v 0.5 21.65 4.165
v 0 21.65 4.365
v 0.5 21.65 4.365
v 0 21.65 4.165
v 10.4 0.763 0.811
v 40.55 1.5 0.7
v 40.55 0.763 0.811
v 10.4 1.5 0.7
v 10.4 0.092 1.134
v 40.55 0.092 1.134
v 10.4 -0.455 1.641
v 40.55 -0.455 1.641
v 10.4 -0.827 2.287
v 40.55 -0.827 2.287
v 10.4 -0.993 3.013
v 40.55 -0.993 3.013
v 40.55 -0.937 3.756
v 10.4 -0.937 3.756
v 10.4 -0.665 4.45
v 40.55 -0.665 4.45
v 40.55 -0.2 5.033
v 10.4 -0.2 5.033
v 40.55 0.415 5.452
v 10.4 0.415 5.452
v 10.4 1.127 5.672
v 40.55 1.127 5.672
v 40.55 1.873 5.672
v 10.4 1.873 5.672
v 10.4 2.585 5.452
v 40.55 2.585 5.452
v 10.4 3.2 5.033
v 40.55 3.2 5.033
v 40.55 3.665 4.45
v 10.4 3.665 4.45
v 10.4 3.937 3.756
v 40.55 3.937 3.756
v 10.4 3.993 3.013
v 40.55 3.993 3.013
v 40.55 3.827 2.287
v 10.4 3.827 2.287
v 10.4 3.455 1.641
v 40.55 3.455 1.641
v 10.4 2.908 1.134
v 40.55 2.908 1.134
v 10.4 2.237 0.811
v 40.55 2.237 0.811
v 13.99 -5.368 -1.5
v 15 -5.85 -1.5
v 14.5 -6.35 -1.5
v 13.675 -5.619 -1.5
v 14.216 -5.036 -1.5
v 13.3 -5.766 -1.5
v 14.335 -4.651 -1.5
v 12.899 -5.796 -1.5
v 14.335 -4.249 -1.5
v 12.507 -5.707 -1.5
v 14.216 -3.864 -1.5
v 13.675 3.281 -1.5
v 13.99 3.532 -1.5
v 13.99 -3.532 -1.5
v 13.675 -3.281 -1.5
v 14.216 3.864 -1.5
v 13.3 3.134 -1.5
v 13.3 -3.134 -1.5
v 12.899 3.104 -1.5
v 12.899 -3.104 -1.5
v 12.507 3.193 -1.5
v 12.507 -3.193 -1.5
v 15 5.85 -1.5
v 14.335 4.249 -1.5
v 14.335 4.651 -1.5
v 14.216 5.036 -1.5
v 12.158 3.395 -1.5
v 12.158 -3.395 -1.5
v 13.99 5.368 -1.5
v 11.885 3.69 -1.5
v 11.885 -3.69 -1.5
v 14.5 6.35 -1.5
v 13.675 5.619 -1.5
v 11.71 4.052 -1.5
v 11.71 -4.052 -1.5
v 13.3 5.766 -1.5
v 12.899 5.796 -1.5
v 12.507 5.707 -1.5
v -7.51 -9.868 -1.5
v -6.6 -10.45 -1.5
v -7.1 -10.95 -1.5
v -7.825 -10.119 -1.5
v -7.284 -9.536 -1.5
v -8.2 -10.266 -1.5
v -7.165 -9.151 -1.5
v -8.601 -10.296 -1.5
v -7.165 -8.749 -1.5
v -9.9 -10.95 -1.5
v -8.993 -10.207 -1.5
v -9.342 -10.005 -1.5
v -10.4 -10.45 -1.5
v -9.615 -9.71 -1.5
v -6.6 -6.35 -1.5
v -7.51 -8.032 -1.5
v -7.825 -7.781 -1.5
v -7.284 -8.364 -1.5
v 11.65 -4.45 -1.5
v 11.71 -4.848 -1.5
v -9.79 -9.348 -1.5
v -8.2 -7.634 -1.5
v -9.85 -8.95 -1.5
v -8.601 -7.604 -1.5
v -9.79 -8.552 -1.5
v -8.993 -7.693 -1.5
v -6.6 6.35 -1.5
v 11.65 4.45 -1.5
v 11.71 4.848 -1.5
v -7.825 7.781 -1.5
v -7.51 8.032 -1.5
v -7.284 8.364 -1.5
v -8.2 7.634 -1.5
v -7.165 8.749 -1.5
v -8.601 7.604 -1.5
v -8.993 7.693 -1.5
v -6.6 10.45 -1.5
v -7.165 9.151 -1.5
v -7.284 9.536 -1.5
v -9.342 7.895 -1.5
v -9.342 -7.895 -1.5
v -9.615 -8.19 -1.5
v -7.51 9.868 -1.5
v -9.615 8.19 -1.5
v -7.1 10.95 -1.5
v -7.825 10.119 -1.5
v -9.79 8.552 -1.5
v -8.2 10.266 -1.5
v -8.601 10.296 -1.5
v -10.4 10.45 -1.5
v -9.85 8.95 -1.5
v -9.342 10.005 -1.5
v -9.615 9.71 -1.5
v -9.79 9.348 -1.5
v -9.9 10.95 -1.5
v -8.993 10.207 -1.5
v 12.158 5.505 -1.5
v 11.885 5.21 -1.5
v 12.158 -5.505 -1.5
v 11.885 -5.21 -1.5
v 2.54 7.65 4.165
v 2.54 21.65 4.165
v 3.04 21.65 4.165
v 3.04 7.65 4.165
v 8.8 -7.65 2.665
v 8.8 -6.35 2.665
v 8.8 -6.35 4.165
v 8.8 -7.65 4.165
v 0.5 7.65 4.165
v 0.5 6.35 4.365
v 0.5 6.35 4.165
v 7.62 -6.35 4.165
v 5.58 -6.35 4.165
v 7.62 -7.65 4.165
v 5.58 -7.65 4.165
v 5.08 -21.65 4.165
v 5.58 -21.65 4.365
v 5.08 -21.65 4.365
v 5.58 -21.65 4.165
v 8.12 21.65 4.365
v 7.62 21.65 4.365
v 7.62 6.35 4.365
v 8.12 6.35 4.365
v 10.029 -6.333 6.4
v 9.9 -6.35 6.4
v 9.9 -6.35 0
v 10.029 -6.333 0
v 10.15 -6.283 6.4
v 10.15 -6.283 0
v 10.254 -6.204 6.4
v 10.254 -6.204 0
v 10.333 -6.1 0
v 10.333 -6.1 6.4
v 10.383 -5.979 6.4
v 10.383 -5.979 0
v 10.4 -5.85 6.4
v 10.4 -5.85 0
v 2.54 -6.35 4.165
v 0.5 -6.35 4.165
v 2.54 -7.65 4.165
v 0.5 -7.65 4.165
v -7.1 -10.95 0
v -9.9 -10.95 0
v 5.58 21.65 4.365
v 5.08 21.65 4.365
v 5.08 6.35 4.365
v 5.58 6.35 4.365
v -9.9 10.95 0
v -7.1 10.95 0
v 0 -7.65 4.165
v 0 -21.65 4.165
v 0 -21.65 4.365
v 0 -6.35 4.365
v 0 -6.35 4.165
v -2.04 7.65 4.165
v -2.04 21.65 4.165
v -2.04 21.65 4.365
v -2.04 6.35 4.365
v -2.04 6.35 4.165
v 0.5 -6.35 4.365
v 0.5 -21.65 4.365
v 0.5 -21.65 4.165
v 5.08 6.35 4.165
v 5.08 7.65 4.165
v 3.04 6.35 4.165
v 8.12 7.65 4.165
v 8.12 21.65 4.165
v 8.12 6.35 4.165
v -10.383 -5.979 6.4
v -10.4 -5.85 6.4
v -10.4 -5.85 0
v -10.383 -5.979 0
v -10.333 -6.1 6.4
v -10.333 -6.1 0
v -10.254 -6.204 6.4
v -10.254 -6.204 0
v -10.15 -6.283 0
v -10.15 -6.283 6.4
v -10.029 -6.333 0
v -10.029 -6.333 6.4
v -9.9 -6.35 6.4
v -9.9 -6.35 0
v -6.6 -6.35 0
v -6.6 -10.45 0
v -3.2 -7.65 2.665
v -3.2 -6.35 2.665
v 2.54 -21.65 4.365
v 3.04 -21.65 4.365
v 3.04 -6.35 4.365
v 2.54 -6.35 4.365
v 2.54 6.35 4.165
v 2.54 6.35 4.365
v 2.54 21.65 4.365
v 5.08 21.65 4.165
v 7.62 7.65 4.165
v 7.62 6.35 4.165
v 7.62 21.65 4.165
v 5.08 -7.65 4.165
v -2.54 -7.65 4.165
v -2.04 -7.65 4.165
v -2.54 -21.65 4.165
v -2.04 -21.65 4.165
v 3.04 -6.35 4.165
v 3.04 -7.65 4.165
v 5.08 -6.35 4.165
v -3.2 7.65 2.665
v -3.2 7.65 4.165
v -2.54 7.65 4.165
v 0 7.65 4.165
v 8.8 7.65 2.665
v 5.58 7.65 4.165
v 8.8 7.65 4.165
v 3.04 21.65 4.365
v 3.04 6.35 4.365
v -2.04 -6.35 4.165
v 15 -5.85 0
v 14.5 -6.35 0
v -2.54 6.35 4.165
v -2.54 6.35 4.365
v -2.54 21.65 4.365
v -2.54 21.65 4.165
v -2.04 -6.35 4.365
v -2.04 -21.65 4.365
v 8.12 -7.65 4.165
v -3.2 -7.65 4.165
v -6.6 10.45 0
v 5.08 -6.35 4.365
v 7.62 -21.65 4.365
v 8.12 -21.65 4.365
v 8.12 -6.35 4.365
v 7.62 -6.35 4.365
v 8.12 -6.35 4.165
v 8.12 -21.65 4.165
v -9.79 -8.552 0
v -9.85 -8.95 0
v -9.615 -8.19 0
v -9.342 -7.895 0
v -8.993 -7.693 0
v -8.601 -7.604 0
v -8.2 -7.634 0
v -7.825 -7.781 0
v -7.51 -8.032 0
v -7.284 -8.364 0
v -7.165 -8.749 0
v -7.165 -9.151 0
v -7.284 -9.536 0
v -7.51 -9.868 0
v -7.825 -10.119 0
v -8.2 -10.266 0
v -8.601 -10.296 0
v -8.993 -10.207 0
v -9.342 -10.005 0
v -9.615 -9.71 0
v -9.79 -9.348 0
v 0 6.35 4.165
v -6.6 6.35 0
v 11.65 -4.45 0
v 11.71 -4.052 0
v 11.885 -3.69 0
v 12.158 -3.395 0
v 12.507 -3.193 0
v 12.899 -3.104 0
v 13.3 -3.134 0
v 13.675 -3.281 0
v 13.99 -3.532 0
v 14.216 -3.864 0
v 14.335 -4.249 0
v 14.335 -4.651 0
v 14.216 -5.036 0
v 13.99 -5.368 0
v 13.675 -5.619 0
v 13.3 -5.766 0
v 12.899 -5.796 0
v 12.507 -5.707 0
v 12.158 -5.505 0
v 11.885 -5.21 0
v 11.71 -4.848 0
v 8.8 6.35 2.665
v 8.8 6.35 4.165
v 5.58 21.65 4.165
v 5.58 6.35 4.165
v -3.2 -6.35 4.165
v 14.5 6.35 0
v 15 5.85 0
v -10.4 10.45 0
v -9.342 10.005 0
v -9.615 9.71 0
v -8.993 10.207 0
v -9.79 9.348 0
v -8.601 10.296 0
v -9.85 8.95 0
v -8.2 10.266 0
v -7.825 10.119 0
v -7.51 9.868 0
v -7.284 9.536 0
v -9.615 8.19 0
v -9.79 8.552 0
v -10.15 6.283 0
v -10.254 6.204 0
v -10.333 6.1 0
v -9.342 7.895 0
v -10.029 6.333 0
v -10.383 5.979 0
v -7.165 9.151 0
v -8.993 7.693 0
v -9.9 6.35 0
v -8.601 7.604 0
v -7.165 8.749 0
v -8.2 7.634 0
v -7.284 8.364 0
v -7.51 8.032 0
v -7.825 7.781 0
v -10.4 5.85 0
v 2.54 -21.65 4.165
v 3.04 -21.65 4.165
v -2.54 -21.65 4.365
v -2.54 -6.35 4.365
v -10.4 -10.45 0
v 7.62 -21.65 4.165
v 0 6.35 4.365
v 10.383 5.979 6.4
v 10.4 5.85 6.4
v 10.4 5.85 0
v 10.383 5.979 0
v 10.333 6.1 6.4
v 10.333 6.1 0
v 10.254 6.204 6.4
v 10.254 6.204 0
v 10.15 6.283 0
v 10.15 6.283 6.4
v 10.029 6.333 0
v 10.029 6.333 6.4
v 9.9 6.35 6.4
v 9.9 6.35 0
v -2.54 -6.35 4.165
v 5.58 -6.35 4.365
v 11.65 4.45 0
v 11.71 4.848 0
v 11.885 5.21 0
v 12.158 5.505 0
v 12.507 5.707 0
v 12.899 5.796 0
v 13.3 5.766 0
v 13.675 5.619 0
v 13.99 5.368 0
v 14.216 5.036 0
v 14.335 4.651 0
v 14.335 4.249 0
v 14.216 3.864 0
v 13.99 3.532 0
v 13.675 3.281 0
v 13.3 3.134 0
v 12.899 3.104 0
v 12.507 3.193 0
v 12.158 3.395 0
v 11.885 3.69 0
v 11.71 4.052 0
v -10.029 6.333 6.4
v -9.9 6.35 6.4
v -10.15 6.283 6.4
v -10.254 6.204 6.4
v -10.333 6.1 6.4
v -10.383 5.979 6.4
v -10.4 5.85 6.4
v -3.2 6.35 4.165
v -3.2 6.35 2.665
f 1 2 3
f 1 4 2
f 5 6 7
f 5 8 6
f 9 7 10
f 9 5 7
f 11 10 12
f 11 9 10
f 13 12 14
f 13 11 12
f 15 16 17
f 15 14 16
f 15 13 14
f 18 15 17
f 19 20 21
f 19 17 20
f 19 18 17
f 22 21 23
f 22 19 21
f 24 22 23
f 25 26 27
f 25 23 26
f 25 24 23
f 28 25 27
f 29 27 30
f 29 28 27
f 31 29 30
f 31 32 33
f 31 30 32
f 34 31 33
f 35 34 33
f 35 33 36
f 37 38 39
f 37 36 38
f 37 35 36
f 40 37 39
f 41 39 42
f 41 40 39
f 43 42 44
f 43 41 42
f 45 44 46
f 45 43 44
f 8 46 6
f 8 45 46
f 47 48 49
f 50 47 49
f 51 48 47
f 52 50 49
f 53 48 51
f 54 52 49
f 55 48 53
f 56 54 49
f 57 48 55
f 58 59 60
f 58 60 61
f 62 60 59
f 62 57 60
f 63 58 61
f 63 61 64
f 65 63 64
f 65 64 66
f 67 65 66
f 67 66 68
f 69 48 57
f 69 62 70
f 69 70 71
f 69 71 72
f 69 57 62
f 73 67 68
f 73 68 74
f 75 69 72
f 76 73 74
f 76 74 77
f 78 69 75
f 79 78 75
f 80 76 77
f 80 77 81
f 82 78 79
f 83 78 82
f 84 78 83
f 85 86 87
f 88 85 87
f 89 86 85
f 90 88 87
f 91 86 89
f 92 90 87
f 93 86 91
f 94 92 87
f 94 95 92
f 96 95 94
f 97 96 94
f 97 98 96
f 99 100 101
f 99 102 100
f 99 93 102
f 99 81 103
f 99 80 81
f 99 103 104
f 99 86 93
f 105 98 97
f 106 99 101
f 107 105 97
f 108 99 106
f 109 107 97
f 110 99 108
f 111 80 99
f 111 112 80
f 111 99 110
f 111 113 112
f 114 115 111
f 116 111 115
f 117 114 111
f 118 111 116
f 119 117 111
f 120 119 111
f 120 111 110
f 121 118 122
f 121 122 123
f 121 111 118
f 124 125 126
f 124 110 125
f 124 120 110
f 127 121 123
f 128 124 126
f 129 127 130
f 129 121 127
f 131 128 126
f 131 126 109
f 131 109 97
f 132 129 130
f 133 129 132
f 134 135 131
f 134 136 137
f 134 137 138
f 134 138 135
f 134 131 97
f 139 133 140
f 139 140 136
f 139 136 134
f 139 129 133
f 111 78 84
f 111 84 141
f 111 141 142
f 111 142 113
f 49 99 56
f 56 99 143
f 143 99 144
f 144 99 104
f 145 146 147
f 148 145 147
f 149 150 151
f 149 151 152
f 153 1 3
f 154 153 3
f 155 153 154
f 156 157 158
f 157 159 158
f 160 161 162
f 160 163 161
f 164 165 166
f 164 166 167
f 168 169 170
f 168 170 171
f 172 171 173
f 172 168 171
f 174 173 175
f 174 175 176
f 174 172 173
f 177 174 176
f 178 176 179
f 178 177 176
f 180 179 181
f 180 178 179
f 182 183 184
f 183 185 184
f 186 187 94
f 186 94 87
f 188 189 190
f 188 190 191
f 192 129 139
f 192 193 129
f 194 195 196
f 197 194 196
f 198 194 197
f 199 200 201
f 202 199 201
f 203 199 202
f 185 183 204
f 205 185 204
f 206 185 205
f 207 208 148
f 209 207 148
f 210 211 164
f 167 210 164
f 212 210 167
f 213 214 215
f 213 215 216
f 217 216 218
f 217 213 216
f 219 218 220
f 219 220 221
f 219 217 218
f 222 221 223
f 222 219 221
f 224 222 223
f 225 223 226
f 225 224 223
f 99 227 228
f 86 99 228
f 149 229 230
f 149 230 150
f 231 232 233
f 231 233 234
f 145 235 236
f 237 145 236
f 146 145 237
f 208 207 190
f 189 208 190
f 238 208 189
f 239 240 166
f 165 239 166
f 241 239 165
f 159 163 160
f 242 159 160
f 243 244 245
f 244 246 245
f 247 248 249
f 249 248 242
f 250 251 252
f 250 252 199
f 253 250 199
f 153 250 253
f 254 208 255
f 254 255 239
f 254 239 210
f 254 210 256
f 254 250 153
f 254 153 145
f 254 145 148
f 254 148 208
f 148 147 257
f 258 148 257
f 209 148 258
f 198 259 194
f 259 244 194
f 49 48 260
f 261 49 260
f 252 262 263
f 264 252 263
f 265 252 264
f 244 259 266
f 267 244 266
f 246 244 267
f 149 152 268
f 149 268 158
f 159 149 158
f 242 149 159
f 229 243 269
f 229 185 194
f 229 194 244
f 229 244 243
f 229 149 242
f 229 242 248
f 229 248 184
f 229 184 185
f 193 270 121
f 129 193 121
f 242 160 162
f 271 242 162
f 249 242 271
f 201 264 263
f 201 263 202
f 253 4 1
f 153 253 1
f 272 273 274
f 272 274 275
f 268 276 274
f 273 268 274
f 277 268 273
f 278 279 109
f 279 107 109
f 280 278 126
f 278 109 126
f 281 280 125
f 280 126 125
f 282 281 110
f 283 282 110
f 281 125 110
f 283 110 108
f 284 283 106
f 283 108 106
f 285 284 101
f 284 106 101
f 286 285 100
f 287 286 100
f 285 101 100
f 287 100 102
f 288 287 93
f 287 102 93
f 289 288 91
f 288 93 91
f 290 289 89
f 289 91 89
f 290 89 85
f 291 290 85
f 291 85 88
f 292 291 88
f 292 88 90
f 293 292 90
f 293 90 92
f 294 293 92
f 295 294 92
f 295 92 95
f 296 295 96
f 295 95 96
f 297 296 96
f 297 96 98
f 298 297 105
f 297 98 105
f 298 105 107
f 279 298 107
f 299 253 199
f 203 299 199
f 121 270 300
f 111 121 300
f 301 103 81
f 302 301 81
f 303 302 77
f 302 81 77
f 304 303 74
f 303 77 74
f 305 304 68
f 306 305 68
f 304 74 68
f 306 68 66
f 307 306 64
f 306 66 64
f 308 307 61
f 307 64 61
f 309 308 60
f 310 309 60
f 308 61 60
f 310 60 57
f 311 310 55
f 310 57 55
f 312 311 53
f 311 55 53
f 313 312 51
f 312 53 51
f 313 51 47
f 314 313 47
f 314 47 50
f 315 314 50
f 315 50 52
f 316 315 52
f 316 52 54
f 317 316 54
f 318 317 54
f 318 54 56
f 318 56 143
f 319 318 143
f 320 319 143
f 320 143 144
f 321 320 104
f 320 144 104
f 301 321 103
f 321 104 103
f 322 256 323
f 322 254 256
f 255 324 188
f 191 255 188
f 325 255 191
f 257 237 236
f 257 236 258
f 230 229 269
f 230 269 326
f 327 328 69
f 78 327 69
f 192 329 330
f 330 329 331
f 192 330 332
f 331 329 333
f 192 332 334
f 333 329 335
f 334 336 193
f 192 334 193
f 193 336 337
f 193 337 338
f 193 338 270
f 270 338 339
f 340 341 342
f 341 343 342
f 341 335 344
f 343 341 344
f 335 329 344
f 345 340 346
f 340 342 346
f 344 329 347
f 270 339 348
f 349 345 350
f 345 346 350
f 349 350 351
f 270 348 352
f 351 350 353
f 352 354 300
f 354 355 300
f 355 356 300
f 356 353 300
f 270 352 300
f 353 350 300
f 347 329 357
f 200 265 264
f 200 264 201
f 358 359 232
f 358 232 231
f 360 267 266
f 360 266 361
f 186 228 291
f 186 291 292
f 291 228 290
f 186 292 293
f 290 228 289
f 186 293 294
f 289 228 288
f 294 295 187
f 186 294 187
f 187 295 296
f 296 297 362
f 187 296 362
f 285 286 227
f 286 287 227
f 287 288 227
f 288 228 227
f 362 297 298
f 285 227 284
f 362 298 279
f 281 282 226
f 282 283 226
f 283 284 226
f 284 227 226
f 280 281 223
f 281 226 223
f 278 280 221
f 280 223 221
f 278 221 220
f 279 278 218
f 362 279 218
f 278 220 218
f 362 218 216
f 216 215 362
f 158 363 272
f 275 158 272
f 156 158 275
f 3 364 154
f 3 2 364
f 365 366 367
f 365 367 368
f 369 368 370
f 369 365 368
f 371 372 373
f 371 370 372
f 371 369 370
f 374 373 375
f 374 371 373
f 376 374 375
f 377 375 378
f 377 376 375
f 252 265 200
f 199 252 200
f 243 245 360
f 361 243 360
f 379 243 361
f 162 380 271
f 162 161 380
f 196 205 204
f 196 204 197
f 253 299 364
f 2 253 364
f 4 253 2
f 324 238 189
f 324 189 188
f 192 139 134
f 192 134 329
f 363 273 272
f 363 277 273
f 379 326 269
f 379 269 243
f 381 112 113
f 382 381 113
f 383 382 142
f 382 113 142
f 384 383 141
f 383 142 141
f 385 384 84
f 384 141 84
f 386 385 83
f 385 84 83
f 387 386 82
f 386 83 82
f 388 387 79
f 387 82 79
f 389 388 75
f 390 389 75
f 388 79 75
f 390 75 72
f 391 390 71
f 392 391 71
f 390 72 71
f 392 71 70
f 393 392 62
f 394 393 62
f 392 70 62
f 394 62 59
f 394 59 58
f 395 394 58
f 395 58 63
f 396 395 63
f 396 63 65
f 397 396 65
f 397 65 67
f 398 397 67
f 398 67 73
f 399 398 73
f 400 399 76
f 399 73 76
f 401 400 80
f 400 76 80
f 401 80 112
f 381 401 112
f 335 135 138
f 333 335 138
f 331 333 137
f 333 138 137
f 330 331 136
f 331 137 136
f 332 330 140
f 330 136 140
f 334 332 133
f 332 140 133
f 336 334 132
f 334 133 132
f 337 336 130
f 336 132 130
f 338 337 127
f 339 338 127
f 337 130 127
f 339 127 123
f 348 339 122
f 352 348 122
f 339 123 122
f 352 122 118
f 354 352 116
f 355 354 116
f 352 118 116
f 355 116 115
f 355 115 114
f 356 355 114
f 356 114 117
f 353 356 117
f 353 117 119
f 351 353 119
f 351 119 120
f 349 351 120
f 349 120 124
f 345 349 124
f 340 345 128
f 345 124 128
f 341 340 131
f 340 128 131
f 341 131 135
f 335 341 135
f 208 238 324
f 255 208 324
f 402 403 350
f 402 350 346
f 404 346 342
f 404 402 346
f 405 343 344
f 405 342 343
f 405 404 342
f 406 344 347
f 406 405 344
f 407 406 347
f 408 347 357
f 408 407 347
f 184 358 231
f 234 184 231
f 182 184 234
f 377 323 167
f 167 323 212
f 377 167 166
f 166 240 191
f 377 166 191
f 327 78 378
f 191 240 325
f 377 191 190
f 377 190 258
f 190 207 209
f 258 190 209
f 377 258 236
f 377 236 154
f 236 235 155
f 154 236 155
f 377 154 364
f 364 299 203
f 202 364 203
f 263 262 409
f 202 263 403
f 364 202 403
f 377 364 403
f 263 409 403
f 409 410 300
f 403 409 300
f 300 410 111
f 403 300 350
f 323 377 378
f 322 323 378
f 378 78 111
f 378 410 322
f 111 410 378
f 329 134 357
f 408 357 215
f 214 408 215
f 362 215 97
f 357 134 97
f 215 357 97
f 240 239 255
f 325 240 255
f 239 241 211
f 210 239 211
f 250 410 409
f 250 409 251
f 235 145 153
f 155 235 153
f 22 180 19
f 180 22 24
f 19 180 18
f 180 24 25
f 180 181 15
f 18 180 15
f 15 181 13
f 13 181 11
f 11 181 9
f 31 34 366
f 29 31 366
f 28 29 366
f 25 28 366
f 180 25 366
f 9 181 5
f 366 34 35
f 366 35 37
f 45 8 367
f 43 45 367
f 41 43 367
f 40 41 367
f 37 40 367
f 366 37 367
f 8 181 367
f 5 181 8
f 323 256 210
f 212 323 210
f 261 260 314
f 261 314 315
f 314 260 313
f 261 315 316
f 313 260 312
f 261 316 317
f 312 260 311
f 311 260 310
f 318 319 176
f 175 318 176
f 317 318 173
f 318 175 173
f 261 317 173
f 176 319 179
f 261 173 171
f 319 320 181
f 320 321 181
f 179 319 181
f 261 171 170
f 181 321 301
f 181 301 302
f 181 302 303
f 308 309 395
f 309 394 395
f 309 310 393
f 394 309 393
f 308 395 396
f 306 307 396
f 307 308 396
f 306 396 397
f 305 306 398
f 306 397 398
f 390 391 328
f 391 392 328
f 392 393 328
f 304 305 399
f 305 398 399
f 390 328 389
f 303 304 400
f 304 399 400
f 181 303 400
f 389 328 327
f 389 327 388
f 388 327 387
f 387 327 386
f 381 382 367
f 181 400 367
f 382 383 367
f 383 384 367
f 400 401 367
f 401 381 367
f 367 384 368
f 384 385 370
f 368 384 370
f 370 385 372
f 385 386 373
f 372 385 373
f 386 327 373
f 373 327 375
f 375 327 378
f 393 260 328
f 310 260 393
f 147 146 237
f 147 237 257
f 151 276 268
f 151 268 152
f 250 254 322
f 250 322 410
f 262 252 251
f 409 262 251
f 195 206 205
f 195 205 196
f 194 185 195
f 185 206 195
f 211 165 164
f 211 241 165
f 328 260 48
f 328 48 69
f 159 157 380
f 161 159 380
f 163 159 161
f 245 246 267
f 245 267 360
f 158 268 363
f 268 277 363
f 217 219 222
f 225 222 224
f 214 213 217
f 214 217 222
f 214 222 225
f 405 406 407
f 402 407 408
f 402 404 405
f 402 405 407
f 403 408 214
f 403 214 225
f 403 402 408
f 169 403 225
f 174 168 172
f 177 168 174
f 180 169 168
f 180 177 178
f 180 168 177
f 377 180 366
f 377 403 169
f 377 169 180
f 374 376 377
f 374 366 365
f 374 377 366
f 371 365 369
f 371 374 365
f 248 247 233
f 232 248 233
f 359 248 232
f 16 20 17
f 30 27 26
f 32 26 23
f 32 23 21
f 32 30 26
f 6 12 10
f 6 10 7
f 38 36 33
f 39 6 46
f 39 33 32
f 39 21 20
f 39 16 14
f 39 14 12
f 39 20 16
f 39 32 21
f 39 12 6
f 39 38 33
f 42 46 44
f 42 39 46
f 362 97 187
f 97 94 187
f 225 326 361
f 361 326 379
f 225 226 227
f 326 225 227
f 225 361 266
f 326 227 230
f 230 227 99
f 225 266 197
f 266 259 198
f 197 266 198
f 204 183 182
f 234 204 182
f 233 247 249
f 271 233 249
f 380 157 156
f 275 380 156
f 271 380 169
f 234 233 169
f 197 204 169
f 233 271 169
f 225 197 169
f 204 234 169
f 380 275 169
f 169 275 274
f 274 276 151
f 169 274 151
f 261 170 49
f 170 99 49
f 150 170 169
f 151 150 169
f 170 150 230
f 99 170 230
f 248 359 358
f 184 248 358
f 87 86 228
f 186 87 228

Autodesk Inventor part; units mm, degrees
ref_plane "YZ Plane" through (0, 0, 0) normal (1, 0, 0) x (0, 1, 0)
ref_plane "XZ Plane" through (0, 0, 0) normal (0, 1, 0) x (-1, 0, 0)
sketch "Sketch1" plane through (0, 0, 0) normal (0, 0, 1) x (1, 0, 0)
  line L0 (-10.4, -6.35) -> (10.4, -6.35)
  line L1 (10.4, -6.35) -> (10.4, 6.35)
  line L2 (10.4, 6.35) -> (-10.4, 6.35)
  line L3 (-10.4, 6.35) -> (-10.4, -6.35)
  line L4 (-10.4, -6.35) -> (10.4, 6.35) construction
  line L5 (10.4, -6.35) -> (-10.4, 6.35) construction
  point P0 (0, 0)
  dimension "d0" = 12.7
  dimension "d1" = 20.8
extrude "Extrusion1" add sketch "Sketch1" along normal blind 6.4
sketch "Sketch4" plane through (0, 0, 0) normal (0, 0, -1) x (-1, 0, 0)
  line L0 (10.4, -10.95) -> (6.6, -10.95)
  line L1 (-15, -6.35) -> (-15, 0)
  line L2 (-15, 0) -> (10.4, 0)
  line L3 (10.4, 0) -> (10.4, -10.95)
  line L4 (10.4, 6.35) -> (10.4, -6.35) projected
  line L5 (-15, -6.35) -> (6.6, -6.35)
  line L6 (6.6, -6.35) -> (6.6, -10.95)
  line L7 (10.4, -6.35) -> (-10.4, -6.35) projected
  point P0 (0, 0)
  dimension "d18" = 10.95
  dimension "d20" = 25.4
  dimension "d21" = 3.8
extrude "Extrusion4" add sketch "Sketch4" along normal blind 1.5
sketch "Sketch5" plane through (0, 0, -1.5) normal (0, 0, -1) x (-1, 0, 0)
  circle A0 centre (8.5, -8.95) radius 1.35
  circle A1 centre (-13, -4.45) radius 1.35
  line L0 (6.6, -10.95) -> (10.4, -10.95) projected
  line L1 (10.4, 0) -> (-15, 0) projected
  line L2 (10.4, -10.95) -> (10.4, 0) projected
  line L3 (-15, 0) -> (-15, -6.35) projected
  line L4 (-15, -6.35) -> (6.6, -6.35) projected
  point P0 (0, 0)
  dimension "d24" = 2.7
  dimension "d26" = 8.95
  dimension "d28" = 1.9
  dimension "d29" = 2
  dimension "d31" = 4.45
extrude "Extrusion5" cut sketch "Sketch5" against normal through all
chamfer "Chamfer2" distance 0.5 angle 45 3 edges at (-10.4, -10.95, -0.75) (-6.6, -10.95, -0.75) (15, -6.35, -0.75)
mirror "Mirror3" about plane through (0, 0, 0) normal (0, 1, 0) of "Extrusion4", "Extrusion5", "Chamfer2"
fillet "Fillet1" radius 0.5 4 edges at (10.4, -6.35, 3.2) (-10.4, -6.35, 3.2) (-10.4, 6.35, 3.2) (10.4, 6.35, 3.2)
ref_plane "Work Plane2" through (0, 0, 2.665) normal (0, 0, -1) x (-1, 0, 0)
sketch "Sketch6" plane through (0, 0, 2.665) normal (0, 0, -1) x (-1, 0, 0)
  line L0 (-9.9, 6.35) -> (9.9, 6.35) projected
  line L1 (-8.8, 6.35) -> (3.2, 6.35)
  line L2 (3.2, 6.35) -> (3.2, 7.65)
  line L3 (3.2, 7.65) -> (-8.8, 7.65)
  line L4 (-8.8, 7.65) -> (-8.8, 6.35)
  line L5 (-10.4, -5.85) -> (-10.4, 5.85) projected
  point P0 (0, 0)
  dimension "d39" = 1.3
  dimension "d40" = 12
  dimension "d41" = 1.6
extrude "Extrusion6" add sketch "Sketch6" against normal blind 1.5
sketch "Sketch7" plane through (0, 0, 4.165) normal (0, 0, 1) x (1, 0, 0)
  line L0 (8.8, 6.35) -> (-3.2, 6.35) projected
  line L1 (8.12, 6.35) -> (7.62, 6.35)
  line L2 (7.62, 6.35) -> (7.62, 21.65)
  line L3 (7.62, 21.65) -> (8.12, 21.65)
  line L4 (8.12, 21.65) -> (8.12, 6.35)
  line L5 (-15.48, 0) -> (20.08, 0) projected
  line L6 (7.87, 6.35) -> (7.87, 21.65) construction
  line L7 (10.4, -5.85) -> (10.4, 5.85) projected
  point P0 (0, 0)
  dimension "d46" = 21.65
  dimension "d47" = 2.53
  dimension "d48" = 0.5
extrude "Extrusion7" add sketch "Sketch7" along normal blind 0.2
pattern_linear "Rectangular Pattern1" count 5 spacing 2.54 along (-1, 0, 0) of "Extrusion7"
mirror "Mirror4" about plane through (0, 0, 0) normal (0, 1, 0) of "Extrusion6", "Extrusion7", "Rectangular Pattern1"
sketch "Sketch8" plane through (-10.4, -10.45, -1.5) normal (-1, 0, 0) x (0, 0, 1)
  line L0 (0, 0) -> (0, 20.9) projected
  line L1 (1.5, 4.1) -> (7.9, 4.1) projected
  point P0 (1.5, 10.45)
  point P1 (4.8, 8.6)
  dimension "d54" = 4.8
  dimension "d55" = 4.5
sketch "Sketch9" plane through (10.4, -5.85, 6.4) normal (1, 0, 0) x (0, 0, -1)
  line L0 (7.9, 0) -> (7.9, 11.7) projected
  line L1 (6.4, 12.2) -> (0, 12.2) projected
  circle A0 centre (3.2, 7.35) radius 2.5
  point P0 (6.4, 5.85)
  dimension "d56" = 4.7
  dimension "d57" = 4.85
  dimension "d58" = 5
extrude "fibre_connect" add sketch "Sketch9" along normal blind 30.15
ref_plane "Work Plane1" through (0, 0, 0) normal (0, 1, 0) x (-1, 0, 0)
ref_plane "Work Plane3" through (0, 0, 0) normal (0, 1, 0) x (-1, 0, 0)
properties part number "gainchip"
